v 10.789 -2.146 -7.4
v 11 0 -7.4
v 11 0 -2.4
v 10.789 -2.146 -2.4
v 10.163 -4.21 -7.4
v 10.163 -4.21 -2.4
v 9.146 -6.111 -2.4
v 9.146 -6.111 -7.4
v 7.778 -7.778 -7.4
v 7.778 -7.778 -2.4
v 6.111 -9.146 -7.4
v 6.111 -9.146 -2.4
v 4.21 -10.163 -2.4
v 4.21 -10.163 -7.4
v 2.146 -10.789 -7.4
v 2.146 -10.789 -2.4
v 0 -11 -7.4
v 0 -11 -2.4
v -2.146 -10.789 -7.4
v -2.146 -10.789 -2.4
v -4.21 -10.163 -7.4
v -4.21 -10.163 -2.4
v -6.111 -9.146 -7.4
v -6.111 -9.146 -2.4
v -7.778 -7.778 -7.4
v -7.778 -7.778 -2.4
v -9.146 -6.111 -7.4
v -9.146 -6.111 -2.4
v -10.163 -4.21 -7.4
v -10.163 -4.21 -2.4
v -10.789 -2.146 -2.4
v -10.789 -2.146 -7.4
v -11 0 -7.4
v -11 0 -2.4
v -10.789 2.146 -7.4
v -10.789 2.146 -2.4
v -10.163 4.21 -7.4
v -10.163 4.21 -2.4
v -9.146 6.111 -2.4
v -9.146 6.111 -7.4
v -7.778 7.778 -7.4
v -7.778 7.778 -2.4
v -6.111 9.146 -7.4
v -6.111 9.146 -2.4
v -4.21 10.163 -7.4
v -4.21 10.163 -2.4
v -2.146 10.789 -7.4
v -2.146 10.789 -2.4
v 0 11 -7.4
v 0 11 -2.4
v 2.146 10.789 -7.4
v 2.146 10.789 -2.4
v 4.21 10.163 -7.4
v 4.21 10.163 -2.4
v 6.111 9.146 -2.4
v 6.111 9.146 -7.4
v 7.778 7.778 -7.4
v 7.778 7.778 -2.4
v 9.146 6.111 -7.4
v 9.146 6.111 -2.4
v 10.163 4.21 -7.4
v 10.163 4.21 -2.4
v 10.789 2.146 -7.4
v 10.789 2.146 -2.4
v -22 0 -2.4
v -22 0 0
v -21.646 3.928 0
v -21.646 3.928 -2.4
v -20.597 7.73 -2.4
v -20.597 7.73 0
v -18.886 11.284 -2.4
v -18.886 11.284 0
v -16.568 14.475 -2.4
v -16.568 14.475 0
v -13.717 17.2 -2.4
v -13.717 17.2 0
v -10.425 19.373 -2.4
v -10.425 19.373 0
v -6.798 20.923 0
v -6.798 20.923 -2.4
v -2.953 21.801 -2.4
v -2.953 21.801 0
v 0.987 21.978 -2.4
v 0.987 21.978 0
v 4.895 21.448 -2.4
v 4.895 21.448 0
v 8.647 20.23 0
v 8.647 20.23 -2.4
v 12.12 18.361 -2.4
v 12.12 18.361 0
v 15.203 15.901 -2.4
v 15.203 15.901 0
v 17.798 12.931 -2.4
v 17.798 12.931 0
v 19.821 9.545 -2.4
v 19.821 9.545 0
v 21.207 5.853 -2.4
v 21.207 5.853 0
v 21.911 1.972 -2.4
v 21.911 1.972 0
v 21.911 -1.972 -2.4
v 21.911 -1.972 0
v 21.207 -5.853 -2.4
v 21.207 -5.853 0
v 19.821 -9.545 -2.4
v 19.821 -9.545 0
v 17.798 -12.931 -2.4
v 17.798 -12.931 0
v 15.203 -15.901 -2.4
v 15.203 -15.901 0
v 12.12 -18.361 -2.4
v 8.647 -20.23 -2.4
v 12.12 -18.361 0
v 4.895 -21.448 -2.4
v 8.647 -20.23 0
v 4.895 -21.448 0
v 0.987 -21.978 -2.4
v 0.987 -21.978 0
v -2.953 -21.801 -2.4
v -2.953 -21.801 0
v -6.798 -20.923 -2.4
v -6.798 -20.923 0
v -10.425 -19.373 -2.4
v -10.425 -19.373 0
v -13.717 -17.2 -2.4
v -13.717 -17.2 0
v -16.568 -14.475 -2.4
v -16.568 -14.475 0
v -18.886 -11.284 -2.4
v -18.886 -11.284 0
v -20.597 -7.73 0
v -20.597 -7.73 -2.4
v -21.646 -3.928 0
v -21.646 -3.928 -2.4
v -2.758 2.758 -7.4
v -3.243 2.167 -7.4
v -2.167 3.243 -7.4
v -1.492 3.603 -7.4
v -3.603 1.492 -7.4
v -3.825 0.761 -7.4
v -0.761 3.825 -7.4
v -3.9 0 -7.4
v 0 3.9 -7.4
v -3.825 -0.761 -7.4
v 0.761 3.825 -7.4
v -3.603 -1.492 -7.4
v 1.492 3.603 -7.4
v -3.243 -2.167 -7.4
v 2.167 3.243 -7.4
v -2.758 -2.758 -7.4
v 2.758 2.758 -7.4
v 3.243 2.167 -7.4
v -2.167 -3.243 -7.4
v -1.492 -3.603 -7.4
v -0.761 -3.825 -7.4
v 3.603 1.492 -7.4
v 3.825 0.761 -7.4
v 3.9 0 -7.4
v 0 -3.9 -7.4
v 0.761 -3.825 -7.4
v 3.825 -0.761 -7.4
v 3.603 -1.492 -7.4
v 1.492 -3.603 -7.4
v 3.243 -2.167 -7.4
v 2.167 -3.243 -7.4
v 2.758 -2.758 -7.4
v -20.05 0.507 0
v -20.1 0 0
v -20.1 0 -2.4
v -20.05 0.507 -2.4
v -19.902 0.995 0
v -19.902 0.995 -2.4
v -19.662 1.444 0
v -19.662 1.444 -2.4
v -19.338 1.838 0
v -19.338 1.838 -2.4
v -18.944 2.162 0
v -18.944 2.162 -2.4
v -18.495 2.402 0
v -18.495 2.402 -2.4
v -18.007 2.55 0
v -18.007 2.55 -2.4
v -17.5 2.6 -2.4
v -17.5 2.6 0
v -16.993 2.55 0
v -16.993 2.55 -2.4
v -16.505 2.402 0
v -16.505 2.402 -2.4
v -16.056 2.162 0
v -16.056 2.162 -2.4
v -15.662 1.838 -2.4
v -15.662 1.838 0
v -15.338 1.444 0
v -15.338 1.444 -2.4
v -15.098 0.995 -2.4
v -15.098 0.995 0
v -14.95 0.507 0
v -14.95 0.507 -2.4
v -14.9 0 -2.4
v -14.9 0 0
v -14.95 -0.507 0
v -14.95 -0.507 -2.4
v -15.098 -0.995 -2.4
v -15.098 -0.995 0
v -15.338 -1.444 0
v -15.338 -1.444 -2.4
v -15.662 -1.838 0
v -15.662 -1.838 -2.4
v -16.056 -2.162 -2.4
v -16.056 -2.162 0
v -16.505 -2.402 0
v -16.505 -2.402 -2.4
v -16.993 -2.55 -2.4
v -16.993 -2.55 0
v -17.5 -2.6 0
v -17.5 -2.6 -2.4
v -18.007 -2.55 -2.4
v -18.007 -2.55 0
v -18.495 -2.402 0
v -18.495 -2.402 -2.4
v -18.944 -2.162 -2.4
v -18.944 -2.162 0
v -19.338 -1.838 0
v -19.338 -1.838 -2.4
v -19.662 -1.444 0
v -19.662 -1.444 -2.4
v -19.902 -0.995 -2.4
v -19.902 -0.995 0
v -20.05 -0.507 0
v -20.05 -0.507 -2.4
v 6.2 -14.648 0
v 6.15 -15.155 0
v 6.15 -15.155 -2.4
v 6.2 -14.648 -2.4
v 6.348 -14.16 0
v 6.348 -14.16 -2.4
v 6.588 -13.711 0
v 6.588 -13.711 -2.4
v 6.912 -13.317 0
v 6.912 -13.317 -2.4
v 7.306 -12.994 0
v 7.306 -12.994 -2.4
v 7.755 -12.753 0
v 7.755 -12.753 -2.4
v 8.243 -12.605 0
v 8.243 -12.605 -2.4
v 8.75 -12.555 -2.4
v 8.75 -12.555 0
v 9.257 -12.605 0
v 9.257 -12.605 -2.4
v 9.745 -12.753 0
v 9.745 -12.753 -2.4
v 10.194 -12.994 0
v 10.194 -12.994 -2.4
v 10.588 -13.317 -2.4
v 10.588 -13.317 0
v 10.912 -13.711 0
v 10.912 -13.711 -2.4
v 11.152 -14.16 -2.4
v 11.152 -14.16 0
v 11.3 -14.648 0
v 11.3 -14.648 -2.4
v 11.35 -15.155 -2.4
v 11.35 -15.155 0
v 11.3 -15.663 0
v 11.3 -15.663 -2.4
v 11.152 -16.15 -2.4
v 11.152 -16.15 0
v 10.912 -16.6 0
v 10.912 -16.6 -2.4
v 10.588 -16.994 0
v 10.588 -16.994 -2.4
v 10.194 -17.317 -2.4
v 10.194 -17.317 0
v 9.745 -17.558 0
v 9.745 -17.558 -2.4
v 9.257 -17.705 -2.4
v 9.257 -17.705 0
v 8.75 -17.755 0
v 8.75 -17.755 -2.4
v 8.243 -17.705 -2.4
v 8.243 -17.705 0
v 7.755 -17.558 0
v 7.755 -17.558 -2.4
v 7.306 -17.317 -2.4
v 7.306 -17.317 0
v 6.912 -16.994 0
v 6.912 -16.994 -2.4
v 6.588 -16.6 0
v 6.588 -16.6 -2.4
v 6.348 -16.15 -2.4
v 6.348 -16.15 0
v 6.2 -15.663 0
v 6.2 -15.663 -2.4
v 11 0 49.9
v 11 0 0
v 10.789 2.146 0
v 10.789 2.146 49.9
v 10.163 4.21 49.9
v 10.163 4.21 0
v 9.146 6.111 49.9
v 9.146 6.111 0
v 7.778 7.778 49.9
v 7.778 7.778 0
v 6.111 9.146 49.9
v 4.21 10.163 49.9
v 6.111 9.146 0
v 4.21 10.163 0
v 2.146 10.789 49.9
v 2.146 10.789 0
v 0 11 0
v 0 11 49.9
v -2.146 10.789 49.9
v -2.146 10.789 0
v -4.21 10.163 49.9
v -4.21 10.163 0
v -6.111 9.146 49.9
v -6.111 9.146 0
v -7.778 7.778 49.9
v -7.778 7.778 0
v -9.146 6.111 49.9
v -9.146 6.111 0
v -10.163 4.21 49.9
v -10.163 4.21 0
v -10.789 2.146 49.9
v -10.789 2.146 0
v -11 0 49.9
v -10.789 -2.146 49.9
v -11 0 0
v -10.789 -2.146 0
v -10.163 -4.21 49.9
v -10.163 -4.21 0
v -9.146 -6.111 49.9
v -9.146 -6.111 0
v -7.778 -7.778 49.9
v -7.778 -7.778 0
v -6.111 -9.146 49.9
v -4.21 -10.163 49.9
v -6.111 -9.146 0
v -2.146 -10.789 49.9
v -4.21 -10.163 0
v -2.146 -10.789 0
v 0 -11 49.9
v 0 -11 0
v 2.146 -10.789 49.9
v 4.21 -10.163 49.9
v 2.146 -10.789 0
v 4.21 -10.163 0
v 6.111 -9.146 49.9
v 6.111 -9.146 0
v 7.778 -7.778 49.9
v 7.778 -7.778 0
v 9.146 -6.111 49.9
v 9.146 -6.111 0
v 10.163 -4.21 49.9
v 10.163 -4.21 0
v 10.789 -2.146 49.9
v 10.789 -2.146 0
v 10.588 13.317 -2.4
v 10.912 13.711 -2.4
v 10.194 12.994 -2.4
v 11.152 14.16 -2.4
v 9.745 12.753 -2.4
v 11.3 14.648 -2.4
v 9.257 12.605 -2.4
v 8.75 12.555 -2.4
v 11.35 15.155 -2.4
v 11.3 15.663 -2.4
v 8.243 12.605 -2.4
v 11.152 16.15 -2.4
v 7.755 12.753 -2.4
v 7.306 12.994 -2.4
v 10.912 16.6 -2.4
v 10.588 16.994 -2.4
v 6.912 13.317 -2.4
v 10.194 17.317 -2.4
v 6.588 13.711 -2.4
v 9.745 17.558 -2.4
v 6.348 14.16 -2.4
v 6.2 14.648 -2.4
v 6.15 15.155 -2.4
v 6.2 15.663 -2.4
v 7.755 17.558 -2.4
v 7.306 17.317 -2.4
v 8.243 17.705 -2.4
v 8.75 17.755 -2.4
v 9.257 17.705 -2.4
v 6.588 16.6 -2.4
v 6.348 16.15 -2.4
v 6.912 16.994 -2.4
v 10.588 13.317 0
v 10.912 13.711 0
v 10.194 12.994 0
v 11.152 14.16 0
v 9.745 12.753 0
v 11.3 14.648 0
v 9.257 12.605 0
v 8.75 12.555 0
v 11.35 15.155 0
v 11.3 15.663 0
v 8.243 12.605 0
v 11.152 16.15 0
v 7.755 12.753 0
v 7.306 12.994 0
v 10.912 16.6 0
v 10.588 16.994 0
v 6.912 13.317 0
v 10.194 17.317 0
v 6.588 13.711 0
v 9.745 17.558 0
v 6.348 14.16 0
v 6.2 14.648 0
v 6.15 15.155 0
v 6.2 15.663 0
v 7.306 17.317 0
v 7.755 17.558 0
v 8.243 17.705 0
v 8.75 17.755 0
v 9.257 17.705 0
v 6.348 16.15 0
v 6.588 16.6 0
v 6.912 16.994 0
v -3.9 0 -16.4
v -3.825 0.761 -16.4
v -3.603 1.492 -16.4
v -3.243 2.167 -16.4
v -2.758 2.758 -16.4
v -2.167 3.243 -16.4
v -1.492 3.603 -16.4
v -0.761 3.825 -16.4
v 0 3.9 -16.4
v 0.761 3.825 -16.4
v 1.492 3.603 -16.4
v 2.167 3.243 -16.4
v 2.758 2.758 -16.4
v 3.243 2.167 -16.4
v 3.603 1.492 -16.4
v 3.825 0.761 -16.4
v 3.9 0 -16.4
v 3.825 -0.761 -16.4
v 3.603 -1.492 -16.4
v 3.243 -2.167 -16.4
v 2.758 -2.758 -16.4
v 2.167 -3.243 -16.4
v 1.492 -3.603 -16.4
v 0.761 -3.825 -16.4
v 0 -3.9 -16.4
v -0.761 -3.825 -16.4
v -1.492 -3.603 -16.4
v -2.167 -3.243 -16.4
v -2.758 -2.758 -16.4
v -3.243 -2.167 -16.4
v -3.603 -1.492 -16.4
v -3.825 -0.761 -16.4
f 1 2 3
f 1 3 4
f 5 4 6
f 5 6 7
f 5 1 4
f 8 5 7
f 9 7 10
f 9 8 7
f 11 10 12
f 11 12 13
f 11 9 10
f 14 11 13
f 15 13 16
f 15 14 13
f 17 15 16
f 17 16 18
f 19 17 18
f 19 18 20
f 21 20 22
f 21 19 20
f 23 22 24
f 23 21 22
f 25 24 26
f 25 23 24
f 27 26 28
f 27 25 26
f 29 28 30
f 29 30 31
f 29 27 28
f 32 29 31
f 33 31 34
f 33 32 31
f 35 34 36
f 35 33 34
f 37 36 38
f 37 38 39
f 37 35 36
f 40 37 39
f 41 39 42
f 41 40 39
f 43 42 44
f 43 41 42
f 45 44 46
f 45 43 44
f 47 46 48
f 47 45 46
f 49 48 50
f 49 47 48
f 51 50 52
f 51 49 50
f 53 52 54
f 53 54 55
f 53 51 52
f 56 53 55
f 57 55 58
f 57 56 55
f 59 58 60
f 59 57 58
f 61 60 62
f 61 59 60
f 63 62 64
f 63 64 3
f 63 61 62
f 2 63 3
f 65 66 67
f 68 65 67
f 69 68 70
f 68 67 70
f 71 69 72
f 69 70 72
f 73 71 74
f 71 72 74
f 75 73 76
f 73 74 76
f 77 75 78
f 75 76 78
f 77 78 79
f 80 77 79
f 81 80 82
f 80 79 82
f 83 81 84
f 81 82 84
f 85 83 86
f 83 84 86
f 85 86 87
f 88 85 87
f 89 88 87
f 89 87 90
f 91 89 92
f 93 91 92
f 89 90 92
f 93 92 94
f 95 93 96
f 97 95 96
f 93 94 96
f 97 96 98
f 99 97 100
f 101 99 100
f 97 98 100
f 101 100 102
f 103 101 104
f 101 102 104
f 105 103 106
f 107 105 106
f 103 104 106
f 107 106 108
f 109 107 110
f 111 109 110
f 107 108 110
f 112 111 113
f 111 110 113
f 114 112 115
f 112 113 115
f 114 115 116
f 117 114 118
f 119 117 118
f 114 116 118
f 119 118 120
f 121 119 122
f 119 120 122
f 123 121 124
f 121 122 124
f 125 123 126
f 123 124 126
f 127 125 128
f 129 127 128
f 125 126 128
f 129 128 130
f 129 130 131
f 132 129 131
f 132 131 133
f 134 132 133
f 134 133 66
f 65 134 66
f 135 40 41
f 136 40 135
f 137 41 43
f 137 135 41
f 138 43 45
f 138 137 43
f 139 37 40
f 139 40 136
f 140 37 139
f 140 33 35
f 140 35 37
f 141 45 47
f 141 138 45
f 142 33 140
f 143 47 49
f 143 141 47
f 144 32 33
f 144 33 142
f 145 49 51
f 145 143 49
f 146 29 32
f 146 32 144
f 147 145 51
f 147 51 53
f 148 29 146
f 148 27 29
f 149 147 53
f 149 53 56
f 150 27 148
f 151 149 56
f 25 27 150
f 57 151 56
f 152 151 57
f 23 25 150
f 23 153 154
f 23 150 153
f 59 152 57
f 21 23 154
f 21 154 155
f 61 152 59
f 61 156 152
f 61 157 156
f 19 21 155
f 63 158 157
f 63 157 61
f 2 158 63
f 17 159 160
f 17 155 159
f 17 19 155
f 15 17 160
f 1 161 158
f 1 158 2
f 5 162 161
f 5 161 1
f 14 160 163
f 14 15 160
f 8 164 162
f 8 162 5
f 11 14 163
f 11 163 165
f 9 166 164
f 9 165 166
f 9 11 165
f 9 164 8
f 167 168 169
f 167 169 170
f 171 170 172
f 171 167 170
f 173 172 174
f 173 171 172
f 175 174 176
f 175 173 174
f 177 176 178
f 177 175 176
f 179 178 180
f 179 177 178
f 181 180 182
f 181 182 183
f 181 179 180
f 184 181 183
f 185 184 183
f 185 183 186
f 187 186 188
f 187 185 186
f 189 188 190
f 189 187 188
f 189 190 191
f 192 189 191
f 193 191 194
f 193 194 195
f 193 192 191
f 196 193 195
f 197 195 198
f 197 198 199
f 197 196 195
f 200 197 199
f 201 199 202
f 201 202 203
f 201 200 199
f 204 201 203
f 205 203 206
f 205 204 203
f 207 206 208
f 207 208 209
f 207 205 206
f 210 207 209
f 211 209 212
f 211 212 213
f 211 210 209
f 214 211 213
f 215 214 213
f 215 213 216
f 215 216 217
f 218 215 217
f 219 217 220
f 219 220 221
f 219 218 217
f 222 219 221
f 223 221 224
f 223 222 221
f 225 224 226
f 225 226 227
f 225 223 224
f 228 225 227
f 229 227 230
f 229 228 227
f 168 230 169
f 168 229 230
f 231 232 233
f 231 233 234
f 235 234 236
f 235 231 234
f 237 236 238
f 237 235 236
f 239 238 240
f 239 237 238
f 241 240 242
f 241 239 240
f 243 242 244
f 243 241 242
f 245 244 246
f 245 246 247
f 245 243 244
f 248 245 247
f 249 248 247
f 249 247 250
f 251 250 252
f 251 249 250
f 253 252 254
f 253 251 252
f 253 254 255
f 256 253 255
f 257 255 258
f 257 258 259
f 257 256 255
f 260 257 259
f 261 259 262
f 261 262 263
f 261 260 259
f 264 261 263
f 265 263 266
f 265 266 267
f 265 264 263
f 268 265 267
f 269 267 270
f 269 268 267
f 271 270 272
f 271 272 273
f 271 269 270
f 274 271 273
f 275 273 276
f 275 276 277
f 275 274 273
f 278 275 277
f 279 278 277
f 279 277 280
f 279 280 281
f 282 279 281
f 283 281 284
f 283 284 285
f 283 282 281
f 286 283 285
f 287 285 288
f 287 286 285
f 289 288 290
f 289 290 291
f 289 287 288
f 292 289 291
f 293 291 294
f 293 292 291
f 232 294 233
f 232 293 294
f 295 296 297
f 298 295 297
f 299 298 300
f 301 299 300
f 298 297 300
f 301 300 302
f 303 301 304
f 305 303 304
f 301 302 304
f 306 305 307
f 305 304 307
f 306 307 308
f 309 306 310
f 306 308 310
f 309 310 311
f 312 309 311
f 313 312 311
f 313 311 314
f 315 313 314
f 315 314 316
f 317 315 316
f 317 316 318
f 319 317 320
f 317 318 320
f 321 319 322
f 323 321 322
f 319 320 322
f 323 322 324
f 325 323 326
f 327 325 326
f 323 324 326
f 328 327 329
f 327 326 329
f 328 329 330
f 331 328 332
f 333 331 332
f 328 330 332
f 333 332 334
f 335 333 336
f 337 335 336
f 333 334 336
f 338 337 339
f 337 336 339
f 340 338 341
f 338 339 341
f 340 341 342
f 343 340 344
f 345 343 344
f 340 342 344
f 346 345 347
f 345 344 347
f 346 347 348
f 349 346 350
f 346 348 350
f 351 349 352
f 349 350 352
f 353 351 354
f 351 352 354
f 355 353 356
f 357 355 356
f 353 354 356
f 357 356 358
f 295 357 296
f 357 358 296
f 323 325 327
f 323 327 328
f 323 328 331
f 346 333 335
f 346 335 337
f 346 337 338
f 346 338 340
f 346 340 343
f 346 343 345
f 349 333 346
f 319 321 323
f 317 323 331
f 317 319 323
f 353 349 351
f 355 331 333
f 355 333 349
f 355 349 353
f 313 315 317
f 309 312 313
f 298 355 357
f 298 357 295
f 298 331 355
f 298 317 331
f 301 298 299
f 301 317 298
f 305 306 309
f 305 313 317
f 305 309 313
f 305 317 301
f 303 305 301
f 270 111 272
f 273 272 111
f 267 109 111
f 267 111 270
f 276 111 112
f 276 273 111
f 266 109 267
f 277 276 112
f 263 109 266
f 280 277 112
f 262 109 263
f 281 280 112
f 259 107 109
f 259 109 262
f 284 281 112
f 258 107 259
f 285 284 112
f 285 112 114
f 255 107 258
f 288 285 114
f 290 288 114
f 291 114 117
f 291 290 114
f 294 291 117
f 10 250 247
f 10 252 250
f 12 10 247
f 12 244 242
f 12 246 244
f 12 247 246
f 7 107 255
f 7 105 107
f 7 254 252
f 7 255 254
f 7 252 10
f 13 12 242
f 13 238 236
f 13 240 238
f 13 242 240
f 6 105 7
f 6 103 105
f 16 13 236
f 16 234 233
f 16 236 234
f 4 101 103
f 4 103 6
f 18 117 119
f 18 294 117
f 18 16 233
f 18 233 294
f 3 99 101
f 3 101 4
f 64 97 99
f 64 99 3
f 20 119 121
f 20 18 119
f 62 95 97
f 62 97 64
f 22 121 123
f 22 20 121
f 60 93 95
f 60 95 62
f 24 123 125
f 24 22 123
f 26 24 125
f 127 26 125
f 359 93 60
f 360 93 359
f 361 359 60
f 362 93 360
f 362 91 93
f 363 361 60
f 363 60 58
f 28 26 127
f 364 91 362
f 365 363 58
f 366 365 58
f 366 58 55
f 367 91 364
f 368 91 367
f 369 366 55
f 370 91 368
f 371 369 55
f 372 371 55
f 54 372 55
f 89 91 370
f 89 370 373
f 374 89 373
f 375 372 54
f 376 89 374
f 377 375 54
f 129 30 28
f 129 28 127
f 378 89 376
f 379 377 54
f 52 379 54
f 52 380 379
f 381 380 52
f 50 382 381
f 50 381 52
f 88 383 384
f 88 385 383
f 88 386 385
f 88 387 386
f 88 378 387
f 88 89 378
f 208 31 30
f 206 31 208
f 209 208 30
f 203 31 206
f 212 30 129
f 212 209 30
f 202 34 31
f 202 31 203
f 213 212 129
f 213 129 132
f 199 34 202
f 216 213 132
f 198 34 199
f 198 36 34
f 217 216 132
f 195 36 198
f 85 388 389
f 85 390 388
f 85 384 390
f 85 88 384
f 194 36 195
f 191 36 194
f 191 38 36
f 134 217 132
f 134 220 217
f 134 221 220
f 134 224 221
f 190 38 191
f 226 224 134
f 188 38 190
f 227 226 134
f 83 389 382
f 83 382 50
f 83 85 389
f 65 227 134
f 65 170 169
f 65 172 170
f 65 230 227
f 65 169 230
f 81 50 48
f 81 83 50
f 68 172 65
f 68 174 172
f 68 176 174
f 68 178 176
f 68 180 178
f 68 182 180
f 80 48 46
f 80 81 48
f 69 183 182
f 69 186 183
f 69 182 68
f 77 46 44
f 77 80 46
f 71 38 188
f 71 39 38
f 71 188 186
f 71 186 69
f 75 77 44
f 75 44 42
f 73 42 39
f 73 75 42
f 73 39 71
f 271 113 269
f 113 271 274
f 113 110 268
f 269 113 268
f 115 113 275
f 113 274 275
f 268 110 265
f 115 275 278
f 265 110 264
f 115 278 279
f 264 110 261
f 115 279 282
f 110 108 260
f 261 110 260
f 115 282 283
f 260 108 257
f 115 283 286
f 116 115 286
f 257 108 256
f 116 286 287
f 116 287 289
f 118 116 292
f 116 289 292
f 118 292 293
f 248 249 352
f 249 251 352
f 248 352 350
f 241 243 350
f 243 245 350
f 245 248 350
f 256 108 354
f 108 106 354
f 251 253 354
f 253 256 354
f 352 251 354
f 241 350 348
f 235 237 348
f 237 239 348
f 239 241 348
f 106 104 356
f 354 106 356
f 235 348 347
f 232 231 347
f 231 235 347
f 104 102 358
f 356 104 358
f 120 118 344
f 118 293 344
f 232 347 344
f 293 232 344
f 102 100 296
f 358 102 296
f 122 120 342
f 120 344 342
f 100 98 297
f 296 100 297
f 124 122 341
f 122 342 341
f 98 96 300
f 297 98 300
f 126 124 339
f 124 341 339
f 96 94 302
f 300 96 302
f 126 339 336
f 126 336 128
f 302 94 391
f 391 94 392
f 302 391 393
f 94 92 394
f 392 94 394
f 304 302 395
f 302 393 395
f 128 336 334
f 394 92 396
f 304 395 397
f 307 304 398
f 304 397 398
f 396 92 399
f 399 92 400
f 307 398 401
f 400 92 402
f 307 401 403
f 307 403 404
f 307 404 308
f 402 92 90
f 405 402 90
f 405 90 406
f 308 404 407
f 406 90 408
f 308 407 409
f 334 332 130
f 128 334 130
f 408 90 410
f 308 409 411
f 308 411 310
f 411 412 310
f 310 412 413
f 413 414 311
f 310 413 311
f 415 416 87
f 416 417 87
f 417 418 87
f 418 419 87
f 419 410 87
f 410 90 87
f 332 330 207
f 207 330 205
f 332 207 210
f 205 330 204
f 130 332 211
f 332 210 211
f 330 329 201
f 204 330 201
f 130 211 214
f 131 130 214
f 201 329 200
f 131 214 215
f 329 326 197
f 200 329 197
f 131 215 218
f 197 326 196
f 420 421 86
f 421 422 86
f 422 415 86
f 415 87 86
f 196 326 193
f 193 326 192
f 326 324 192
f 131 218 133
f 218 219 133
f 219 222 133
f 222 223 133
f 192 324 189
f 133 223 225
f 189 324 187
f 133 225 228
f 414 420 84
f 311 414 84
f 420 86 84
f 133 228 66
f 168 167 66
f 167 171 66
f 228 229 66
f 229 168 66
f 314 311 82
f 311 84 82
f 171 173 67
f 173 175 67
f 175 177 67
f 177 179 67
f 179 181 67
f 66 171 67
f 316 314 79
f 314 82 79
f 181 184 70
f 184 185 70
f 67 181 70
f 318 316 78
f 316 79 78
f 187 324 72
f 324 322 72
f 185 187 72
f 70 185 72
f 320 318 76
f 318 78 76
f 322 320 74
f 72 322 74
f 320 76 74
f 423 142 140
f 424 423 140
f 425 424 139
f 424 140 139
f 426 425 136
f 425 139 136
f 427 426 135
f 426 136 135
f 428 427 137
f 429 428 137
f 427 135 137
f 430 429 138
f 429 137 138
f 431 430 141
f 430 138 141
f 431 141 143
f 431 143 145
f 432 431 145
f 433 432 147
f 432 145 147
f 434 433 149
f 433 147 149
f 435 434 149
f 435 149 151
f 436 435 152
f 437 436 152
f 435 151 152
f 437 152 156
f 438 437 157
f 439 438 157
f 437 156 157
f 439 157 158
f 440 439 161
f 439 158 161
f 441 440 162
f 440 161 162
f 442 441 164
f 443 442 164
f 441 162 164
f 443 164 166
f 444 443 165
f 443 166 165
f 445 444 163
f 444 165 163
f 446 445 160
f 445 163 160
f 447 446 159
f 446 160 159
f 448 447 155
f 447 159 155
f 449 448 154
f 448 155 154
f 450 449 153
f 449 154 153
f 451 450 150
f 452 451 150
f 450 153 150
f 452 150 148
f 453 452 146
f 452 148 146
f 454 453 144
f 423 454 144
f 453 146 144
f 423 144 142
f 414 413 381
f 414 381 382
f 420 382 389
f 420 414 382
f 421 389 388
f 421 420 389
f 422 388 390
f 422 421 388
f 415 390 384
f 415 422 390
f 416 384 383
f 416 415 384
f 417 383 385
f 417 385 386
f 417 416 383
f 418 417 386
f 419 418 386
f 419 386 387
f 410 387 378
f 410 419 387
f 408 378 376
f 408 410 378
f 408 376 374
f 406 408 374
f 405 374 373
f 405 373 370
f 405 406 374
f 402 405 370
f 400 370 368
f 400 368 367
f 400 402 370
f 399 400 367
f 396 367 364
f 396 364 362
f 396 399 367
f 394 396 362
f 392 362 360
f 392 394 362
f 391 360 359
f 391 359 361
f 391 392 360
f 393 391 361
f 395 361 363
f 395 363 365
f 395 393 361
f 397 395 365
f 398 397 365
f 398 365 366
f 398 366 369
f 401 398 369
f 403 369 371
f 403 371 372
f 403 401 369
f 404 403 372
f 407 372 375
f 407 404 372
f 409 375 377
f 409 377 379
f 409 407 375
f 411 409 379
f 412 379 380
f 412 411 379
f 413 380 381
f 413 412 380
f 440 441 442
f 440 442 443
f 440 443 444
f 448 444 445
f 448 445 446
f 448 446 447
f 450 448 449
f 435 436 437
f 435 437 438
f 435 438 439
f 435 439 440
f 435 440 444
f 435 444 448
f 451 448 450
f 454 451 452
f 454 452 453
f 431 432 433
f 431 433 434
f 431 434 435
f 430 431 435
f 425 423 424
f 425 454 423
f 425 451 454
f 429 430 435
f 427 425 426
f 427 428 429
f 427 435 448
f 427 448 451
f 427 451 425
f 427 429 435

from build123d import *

# Parameters (mm, degrees)
ESQUISSE1_R        = 11
BOSS_EXTRU_1_DEPTH = 49.9
ESQUISSE2_R        = 22
ESQUISSE2_R_2      = 2.6
BOSS_EXTRU_2_DEPTH = 2.4
BOSS_EXTRU_3_START = 5
ESQUISSE3_R        = 11
BOSS_EXTRU_3_DEPTH = 5
ESQUISSE4_R        = 3.9
BOSS_EXTRU_4_DEPTH = 9


with BuildPart() as part:
    # Esquisse1 → Boss.-Extru.1 (new body)
    with BuildSketch(Plane.XY):
        Circle(ESQUISSE1_R)
    extrude(amount=BOSS_EXTRU_1_DEPTH)

    # Esquisse2 → Boss.-Extru.2 (add)
    with BuildSketch(Plane(origin=(0, 0, 0), x_dir=(-1, 0, 0), z_dir=(0, 0, -1))):
        Circle(ESQUISSE2_R)
        with Locations((17.5, 0)):
            Circle(ESQUISSE2_R_2, mode=Mode.SUBTRACT)
        with Locations((-8.75, -15.155444566)):
            Circle(ESQUISSE2_R_2, mode=Mode.SUBTRACT)
        with Locations((-8.75, 15.155444566)):
            Circle(ESQUISSE2_R_2, mode=Mode.SUBTRACT)
    extrude(amount=BOSS_EXTRU_2_DEPTH)

    # Esquisse3 → Boss.-Extru.3 (add)
    with BuildSketch(Plane(origin=(0, 0, -2.4), x_dir=(-1, 0, 0), z_dir=(0, 0, -1)).offset(BOSS_EXTRU_3_START)):
        with Locations(Location((0, 0, 0), (0, 0, 180))):
            Circle(ESQUISSE3_R)
    extrude(amount=-BOSS_EXTRU_3_DEPTH)

    # Esquisse4 → Boss.-Extru.4 (add)
    with BuildSketch(Plane(origin=(0, 0, -7.4), x_dir=(-1, 0, 0), z_dir=(0, 0, -1))):
        Circle(ESQUISSE4_R)
    extrude(amount=BOSS_EXTRU_4_DEPTH)


solid = part.part
